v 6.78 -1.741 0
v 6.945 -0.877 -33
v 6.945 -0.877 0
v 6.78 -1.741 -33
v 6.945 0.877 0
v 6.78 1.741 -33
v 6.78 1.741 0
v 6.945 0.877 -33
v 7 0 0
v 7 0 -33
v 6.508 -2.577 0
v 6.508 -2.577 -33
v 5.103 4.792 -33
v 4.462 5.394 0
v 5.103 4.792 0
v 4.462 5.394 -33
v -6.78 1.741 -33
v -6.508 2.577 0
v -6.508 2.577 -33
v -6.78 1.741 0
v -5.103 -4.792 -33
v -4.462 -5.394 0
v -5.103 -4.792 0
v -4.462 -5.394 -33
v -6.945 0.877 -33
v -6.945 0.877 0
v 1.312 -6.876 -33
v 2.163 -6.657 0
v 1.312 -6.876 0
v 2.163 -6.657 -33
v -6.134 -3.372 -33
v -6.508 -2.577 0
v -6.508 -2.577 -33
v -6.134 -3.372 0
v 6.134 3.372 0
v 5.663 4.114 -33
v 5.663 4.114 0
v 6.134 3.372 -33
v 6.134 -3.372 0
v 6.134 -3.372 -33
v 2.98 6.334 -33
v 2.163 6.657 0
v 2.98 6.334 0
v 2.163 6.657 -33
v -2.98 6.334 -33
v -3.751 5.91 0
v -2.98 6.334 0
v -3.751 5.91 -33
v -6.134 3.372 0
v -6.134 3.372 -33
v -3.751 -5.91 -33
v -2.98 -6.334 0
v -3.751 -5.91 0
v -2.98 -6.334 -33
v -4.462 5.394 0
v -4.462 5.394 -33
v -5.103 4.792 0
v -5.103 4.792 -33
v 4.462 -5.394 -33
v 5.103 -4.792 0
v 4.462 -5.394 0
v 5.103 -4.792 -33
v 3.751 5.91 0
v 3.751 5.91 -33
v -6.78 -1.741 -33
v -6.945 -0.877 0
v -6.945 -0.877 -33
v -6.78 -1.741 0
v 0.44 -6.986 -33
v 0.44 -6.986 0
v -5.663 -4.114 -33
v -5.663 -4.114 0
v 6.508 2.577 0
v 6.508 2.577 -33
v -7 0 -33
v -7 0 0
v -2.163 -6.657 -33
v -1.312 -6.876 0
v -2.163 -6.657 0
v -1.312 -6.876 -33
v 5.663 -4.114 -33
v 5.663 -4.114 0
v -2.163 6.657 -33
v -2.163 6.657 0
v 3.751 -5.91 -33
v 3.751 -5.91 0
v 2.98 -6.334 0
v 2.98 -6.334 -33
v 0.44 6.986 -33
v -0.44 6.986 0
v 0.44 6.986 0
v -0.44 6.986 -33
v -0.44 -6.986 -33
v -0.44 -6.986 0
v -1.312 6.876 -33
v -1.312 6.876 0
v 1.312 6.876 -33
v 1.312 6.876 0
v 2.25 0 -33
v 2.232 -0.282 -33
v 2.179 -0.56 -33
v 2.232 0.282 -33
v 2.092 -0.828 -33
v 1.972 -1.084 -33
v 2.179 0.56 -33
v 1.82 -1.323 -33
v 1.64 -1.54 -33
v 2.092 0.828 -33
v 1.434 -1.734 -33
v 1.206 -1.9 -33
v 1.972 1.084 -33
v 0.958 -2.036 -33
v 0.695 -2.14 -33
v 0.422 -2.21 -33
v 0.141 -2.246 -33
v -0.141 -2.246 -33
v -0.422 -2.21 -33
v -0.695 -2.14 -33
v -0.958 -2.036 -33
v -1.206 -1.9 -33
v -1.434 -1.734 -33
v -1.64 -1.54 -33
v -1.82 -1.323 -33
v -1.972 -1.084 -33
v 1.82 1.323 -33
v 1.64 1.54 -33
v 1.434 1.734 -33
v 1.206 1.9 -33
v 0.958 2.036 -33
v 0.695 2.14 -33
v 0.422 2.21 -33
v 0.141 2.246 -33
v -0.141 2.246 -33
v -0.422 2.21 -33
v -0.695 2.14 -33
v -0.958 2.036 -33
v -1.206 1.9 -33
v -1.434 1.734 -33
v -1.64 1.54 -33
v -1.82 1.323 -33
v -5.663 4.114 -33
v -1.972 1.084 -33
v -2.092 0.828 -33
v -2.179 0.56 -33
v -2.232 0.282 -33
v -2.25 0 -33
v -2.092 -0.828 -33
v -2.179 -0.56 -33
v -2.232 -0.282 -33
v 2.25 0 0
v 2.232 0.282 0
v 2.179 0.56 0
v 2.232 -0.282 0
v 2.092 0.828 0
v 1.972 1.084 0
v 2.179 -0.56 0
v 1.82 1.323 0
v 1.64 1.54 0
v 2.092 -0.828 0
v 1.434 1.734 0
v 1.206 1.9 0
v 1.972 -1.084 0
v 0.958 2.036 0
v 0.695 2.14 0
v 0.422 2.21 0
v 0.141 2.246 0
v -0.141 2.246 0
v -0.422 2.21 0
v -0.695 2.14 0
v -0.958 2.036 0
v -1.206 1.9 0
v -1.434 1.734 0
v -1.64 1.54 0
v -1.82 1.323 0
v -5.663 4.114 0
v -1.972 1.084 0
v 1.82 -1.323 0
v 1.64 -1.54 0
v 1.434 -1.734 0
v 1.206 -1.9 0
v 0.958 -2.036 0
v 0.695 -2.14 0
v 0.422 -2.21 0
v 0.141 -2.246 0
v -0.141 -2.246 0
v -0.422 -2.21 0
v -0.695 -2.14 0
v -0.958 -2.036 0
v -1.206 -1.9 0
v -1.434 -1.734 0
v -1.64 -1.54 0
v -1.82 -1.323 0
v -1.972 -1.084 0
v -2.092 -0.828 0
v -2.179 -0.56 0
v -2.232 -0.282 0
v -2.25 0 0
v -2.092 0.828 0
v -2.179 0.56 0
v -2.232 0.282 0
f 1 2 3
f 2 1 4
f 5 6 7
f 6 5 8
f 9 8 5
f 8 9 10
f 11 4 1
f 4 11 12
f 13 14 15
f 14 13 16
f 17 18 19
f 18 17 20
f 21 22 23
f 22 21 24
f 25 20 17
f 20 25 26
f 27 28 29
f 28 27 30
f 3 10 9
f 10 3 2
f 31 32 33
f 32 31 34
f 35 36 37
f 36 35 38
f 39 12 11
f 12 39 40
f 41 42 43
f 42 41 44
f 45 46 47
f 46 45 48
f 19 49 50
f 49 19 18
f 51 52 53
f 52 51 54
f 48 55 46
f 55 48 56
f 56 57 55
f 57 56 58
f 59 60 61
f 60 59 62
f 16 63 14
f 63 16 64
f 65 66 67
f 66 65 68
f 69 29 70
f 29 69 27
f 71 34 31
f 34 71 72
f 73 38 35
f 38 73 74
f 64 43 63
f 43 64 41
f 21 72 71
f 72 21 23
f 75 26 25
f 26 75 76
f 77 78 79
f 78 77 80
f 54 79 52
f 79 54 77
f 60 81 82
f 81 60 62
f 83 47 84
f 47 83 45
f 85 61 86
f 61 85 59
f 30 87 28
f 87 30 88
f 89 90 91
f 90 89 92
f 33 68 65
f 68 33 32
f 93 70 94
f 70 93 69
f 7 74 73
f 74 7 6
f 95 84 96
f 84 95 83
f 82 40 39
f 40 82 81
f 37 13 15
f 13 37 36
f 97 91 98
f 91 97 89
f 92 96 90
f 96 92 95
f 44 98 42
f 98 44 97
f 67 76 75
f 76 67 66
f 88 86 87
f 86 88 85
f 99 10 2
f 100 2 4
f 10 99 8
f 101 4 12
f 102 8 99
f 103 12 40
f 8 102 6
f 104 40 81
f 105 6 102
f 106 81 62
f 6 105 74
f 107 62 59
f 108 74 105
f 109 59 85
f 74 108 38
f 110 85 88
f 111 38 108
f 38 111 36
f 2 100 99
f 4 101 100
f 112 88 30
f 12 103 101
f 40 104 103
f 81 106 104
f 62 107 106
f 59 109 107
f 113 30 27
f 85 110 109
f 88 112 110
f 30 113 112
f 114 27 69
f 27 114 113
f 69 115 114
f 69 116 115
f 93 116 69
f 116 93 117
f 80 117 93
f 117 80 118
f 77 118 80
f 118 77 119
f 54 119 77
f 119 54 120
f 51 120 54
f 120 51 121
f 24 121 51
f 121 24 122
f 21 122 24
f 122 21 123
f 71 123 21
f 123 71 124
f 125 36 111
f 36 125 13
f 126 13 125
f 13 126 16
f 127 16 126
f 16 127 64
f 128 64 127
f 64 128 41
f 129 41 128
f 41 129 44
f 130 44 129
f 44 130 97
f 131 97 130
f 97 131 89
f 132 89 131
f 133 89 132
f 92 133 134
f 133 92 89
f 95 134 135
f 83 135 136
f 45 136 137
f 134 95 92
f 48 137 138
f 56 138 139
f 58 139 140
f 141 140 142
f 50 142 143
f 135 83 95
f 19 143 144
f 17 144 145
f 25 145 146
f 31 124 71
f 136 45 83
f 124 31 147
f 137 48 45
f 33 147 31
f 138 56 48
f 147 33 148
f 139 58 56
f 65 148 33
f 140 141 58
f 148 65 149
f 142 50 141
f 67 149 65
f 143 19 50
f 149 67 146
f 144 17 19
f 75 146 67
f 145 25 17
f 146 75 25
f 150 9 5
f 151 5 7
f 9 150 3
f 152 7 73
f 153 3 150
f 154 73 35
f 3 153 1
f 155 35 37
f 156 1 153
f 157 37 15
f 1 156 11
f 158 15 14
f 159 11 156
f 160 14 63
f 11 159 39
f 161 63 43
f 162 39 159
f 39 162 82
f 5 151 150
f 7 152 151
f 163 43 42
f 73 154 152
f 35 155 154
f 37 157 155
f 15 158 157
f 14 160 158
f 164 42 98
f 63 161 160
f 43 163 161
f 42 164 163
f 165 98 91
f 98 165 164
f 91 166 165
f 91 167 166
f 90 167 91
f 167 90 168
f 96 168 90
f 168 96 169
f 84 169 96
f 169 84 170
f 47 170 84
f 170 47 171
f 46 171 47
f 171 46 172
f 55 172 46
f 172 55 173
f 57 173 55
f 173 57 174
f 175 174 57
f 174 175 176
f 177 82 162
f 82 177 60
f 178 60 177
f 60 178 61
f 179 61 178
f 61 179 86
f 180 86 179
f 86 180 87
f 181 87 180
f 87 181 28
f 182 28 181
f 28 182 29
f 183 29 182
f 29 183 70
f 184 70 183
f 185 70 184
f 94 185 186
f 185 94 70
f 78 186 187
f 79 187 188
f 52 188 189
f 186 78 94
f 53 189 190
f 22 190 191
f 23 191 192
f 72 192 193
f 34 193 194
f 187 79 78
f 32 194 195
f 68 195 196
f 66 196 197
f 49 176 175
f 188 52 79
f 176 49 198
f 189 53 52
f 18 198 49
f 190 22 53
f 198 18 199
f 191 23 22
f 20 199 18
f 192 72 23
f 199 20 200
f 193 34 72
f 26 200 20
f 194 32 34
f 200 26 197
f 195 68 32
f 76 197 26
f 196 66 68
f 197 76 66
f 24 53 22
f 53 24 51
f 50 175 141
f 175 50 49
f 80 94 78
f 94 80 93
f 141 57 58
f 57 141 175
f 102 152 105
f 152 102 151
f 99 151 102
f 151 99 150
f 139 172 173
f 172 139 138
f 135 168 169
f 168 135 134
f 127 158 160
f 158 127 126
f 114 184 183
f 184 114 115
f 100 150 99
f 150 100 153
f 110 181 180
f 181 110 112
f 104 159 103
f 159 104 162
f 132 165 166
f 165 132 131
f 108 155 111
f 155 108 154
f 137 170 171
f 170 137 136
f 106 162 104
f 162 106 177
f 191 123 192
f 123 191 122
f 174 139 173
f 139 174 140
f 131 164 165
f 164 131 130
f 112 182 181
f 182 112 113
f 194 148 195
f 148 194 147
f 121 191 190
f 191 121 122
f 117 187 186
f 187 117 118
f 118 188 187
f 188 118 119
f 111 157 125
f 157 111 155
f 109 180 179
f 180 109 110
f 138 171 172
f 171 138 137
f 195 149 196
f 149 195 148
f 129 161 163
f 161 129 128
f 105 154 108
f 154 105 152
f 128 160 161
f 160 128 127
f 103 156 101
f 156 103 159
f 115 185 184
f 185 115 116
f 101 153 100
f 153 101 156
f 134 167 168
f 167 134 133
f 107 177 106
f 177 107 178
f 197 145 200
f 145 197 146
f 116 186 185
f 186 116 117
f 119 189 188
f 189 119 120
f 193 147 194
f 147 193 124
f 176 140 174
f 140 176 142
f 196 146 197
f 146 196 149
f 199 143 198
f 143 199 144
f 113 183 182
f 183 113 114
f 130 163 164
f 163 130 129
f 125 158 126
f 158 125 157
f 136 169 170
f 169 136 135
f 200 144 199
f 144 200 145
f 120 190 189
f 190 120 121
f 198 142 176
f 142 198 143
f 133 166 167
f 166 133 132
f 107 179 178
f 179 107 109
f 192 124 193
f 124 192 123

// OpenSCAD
$fn = 50;


difference() {
	union() {
		translate(v = [0, 0, -33.0000000000]) {
			cylinder(h = 33, r = 7.0000000000);
		}
		cylinder(h = 0, r = 13.0000000000);
	}
	union() {
		#translate(v = [0, 0, -33]) {
			cylinder(h = 33, r = 2.2500000000);
		}
	}
}
